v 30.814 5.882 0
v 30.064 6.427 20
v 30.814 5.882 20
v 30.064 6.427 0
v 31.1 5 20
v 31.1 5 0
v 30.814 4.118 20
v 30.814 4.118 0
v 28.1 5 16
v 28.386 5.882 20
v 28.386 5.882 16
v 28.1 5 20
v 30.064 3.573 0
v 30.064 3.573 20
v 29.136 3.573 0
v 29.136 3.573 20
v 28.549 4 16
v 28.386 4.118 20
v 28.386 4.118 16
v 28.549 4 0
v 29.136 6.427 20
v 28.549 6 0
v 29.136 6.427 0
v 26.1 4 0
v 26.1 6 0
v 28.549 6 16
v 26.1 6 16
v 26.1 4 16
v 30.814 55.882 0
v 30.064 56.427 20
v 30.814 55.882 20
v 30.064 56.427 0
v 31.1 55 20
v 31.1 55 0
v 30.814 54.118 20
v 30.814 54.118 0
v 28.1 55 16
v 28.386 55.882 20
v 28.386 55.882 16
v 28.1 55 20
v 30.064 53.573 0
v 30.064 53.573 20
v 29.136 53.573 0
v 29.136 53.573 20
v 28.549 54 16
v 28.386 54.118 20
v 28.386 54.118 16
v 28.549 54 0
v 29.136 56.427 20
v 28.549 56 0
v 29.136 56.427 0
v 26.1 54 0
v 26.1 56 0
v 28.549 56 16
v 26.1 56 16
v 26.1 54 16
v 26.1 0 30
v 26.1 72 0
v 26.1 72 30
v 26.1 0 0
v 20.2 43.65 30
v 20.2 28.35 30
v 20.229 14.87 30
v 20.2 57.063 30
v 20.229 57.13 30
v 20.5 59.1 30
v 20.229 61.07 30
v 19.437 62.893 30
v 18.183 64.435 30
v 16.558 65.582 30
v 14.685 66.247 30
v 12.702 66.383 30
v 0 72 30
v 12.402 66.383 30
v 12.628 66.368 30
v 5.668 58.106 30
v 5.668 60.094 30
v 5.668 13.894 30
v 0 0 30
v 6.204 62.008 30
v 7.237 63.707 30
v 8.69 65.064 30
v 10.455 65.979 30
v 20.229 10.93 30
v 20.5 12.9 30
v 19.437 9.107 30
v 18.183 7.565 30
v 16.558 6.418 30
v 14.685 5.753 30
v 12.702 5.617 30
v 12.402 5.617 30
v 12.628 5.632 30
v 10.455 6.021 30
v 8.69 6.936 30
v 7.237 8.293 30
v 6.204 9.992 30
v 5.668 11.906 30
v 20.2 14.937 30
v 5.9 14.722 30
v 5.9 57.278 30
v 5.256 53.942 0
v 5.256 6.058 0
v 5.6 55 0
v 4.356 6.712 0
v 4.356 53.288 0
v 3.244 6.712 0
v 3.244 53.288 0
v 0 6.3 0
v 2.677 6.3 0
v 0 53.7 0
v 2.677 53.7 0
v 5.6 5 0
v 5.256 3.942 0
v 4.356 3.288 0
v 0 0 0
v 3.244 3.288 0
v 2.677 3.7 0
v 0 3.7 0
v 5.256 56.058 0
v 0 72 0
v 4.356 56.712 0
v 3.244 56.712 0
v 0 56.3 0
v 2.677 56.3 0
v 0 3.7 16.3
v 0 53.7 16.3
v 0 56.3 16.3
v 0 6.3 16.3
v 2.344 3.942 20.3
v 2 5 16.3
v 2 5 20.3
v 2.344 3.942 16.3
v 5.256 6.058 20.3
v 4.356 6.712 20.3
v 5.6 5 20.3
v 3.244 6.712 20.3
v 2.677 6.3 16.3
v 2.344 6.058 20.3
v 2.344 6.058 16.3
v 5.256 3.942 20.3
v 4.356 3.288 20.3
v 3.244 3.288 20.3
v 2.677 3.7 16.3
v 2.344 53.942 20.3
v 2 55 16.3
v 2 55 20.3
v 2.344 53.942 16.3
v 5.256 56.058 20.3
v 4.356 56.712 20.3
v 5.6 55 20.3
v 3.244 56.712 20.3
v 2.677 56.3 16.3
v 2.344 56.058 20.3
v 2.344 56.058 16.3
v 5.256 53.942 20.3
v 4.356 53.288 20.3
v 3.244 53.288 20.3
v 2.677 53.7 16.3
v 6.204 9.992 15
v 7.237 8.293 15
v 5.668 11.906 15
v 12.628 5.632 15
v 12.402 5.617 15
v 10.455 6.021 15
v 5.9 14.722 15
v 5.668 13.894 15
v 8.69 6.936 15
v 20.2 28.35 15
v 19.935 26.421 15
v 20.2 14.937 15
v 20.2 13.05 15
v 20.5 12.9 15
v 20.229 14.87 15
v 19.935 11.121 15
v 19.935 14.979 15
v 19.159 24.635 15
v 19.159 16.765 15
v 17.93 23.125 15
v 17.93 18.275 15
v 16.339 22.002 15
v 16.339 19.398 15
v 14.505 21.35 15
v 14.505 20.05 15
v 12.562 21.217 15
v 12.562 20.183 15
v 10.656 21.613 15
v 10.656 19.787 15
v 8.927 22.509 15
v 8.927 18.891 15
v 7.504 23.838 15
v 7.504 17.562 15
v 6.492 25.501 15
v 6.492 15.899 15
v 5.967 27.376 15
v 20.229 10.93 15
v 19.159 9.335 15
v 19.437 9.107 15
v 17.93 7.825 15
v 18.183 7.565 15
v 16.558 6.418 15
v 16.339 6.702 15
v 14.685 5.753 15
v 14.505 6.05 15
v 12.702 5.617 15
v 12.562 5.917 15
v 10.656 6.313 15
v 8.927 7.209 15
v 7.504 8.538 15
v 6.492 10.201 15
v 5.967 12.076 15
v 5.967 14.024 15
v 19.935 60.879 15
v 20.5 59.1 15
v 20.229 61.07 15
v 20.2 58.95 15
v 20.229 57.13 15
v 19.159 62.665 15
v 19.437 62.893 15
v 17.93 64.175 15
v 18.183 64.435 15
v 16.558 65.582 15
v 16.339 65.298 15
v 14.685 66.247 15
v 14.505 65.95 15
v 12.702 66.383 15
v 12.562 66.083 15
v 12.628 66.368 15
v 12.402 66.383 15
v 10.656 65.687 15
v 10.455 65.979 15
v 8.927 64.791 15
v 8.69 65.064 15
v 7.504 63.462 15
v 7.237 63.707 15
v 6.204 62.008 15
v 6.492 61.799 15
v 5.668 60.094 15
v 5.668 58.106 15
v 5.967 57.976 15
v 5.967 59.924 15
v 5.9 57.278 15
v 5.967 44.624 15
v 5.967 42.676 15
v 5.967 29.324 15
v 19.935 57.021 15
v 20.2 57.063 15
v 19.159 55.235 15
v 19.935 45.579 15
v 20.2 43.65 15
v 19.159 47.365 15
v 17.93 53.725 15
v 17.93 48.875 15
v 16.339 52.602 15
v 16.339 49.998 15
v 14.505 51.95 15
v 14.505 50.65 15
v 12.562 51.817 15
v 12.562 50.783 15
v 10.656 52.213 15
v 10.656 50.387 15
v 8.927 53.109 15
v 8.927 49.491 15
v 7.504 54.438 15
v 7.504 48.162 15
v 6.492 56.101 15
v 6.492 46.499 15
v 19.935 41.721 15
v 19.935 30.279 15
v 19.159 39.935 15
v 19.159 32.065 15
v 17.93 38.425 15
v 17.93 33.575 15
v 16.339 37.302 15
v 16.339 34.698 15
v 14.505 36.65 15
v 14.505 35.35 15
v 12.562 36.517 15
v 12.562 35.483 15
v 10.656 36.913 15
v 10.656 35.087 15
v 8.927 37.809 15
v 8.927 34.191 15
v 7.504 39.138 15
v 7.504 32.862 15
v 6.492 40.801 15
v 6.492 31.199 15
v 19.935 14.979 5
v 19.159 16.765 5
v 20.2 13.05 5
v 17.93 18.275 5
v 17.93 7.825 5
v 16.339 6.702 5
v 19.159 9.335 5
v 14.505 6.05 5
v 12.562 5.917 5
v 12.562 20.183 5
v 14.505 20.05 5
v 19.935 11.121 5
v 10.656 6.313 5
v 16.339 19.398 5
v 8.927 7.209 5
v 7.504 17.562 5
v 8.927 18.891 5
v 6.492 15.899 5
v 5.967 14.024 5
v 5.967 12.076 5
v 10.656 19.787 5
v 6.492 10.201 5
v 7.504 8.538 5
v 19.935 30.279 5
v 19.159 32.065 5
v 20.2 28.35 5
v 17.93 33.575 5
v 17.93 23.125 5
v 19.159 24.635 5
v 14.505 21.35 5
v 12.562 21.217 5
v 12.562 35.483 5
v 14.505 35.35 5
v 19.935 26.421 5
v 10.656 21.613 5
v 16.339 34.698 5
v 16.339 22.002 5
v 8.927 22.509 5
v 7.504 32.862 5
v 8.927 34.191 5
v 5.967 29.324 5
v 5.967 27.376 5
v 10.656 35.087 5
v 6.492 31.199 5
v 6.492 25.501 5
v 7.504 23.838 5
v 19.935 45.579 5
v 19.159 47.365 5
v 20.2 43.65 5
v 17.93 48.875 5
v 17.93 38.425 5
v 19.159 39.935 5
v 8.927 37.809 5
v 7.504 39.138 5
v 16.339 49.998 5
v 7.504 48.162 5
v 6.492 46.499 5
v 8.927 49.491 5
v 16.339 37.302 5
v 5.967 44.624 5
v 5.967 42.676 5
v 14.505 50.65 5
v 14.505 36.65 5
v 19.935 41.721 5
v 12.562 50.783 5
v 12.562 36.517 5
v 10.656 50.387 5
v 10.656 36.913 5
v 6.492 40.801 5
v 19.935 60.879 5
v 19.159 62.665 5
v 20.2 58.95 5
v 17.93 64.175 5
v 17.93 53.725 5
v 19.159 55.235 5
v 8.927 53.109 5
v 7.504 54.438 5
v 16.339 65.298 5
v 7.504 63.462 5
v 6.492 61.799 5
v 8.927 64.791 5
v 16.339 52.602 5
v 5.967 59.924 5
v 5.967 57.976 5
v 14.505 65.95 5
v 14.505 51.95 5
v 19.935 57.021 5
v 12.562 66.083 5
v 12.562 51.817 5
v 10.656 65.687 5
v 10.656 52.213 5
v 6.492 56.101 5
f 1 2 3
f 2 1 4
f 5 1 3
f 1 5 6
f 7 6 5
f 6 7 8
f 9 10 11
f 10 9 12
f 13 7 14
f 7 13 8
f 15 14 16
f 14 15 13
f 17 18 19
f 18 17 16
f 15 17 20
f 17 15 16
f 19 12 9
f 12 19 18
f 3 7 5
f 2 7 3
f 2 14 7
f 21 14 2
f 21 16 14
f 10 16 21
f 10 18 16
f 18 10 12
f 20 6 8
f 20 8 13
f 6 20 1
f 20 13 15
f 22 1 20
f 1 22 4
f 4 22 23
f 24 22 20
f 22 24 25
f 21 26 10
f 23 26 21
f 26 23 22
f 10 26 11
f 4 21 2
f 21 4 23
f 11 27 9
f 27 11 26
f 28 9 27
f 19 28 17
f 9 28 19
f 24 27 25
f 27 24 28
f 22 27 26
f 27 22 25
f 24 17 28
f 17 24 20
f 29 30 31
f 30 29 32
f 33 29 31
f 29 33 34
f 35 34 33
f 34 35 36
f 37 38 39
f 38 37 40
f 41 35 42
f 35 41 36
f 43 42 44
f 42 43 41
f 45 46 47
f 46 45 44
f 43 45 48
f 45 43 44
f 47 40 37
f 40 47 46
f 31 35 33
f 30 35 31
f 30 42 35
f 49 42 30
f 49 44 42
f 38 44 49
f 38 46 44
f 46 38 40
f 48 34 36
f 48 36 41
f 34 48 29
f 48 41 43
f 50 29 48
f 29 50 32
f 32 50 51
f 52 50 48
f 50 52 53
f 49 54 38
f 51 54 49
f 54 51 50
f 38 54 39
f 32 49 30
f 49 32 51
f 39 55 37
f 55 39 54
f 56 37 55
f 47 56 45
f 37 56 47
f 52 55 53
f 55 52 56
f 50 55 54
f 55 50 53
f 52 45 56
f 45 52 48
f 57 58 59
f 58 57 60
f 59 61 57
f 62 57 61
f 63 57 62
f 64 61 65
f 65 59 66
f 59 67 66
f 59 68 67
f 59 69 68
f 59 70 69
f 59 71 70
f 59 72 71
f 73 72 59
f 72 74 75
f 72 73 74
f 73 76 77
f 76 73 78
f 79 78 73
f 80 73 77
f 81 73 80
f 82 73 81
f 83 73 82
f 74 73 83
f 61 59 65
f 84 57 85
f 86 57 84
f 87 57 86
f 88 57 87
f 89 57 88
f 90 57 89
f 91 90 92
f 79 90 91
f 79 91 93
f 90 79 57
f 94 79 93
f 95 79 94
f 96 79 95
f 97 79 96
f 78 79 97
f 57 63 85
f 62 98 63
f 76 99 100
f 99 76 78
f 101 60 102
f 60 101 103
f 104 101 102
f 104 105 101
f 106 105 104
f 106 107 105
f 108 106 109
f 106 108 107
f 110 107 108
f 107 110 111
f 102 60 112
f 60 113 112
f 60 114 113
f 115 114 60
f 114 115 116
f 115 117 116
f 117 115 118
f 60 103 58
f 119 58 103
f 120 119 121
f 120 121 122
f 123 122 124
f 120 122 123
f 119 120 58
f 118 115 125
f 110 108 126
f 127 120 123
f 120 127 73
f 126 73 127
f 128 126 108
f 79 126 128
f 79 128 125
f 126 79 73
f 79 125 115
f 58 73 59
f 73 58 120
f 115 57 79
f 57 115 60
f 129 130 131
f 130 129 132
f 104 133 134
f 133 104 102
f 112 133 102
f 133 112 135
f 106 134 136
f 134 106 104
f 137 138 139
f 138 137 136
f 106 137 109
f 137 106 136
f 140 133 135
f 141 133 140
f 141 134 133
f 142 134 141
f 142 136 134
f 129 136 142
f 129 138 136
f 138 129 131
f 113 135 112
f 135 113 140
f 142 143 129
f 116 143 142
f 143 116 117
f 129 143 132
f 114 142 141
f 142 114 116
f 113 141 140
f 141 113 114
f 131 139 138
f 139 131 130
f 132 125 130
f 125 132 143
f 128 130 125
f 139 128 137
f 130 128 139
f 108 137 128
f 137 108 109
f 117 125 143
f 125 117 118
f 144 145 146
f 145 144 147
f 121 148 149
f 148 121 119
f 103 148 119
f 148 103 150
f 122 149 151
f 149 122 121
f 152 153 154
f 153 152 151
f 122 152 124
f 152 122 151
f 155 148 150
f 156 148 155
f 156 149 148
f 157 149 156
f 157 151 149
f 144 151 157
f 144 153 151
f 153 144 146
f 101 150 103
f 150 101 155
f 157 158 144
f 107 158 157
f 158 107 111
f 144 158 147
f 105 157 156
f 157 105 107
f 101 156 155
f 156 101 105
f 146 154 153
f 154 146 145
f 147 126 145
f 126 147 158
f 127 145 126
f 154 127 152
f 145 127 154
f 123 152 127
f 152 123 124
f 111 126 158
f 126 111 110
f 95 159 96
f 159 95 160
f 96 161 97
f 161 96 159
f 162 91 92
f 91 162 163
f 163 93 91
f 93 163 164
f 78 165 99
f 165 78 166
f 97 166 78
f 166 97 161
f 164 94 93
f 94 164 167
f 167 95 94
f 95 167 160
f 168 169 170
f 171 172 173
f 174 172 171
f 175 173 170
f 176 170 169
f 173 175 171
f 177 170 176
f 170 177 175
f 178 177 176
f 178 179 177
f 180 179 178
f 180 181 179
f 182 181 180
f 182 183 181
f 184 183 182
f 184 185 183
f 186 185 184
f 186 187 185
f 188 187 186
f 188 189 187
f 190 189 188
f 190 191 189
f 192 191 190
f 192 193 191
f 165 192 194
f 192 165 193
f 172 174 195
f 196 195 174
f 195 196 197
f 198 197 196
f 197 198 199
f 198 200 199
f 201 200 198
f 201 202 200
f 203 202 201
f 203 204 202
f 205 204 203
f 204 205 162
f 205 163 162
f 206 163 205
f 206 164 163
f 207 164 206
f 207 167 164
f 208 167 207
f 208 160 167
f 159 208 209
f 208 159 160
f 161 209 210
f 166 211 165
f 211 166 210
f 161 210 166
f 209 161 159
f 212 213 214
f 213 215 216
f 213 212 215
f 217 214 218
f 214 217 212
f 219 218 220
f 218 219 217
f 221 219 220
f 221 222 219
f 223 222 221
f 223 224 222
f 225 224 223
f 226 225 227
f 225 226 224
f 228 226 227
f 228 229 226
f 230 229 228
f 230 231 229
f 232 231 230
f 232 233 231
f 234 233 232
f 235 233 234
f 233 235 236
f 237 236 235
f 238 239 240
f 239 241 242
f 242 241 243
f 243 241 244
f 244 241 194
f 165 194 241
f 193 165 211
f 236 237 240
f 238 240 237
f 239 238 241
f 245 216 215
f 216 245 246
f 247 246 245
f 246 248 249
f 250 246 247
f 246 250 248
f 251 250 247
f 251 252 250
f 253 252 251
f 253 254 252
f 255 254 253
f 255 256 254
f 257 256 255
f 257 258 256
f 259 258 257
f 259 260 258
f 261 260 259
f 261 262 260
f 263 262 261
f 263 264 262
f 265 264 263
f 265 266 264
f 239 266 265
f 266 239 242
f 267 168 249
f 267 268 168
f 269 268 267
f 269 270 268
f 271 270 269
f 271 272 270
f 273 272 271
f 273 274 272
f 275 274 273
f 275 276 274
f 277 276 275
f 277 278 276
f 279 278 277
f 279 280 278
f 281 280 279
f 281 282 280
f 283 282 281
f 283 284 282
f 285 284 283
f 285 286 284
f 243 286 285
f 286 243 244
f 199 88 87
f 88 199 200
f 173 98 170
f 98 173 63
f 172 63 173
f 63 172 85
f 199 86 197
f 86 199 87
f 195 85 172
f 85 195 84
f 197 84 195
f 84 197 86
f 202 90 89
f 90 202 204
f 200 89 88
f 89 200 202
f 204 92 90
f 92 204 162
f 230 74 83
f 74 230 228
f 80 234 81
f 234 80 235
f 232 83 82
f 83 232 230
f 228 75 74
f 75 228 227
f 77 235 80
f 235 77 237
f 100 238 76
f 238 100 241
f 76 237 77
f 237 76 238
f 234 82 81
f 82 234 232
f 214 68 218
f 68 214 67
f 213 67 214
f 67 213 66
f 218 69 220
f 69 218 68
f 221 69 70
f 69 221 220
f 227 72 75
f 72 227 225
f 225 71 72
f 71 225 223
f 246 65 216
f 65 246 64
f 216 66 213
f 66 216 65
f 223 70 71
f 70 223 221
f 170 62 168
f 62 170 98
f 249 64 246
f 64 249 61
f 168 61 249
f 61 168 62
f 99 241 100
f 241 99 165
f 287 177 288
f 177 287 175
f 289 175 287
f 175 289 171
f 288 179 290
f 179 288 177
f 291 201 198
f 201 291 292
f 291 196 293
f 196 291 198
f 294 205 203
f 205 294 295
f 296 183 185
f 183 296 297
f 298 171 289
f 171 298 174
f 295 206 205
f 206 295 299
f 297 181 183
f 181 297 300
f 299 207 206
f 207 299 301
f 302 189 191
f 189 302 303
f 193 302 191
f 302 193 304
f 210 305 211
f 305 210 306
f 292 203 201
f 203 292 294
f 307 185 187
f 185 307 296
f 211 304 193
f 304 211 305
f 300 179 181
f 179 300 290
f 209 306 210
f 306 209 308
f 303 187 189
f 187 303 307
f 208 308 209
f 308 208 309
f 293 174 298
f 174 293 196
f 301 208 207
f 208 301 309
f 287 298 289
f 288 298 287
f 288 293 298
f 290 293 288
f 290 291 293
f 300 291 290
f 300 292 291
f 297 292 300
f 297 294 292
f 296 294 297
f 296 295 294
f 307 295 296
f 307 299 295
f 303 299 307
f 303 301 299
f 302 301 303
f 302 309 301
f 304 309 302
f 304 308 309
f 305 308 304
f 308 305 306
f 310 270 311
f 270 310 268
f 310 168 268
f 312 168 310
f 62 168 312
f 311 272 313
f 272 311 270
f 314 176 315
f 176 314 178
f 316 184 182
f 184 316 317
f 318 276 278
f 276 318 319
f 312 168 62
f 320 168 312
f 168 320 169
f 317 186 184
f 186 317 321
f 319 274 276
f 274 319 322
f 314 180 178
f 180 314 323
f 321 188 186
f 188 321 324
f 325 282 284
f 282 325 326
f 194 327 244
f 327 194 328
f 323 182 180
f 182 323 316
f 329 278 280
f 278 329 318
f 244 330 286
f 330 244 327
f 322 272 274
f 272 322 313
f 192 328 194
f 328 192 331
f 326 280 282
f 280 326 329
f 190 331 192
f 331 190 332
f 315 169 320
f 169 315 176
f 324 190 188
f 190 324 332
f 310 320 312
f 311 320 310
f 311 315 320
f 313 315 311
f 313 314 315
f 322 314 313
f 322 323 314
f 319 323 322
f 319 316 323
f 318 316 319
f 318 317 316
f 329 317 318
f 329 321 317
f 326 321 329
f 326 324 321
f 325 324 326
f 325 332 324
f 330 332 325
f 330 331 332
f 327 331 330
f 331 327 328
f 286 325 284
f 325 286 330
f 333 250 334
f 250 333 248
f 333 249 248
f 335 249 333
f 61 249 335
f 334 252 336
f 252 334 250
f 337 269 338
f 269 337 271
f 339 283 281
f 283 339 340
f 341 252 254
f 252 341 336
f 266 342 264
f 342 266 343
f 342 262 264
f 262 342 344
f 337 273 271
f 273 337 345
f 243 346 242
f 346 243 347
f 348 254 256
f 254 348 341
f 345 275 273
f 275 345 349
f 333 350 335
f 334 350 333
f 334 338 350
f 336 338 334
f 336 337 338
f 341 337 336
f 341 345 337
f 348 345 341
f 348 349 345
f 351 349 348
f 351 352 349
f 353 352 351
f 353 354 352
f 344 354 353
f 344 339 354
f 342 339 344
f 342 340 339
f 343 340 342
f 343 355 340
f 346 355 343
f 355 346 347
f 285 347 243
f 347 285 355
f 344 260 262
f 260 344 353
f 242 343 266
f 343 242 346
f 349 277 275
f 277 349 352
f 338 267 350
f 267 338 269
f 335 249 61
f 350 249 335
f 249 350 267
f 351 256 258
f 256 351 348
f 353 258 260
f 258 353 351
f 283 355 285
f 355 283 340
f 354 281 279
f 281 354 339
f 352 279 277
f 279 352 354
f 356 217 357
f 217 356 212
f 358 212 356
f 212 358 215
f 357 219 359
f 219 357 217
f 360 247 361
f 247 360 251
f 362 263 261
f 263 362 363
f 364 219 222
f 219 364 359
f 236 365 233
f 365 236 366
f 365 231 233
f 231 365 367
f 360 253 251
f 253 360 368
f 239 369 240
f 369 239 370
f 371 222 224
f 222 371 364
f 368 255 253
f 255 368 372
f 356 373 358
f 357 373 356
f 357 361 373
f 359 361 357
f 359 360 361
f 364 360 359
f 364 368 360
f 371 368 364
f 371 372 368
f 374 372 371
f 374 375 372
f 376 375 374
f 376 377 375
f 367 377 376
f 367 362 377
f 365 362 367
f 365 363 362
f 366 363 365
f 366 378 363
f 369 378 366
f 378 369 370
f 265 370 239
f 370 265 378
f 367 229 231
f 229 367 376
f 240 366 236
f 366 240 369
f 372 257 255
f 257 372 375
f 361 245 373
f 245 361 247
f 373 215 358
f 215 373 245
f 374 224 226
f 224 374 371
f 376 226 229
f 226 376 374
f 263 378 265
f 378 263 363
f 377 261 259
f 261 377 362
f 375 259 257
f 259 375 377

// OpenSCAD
/* [Battery Box] */

// The type of battery to hold in the box
type="cylinder"; // [bundle:Round Battery Bundle,cylinder:Round Battery,block:Sqaure Battery]

/* [Bundles] */

// Number of batteries wide in each bundle
bundle_width_count=4; // [2:100]

// Number of batteries long in each bundle
bundle_length_count=1; // [2:100]

// Spacing between batteries in bundles in mm (usually 0)
battery_bundle_spacing=0; // [0:10]

/* [Round Battery] */

// Battery diameter in mm
battery_diameter=14; // [1:100]

/* [Square Battery] */

battery_width=26; // [1:100]
battery_length=17; // [1:100]

/* [Print Details] */

// How much room to give batteries in the box in mm
battery_clearance=0.3; // [0:0.05:1]

/* [Hidden] */

battery_diameter_w_clearance=battery_diameter+battery_clearance;

battery_width_w_clearance=battery_width+battery_clearance;
battery_length_w_clearance=battery_length+battery_clearance;

bundle_width=bundle_width_count*battery_diameter+battery_bundle_spacing*(bundle_width_count-1)+battery_clearance*2;
bundle_length=bundle_length_count*battery_diameter+battery_bundle_spacing*(bundle_length_count-1)+battery_clearance*2;

/* [Battery Box] */

// Number of batteries or bundles wide
battbox_count_wide=1; // [1:100]

// Number of batteries or bundles long
battbox_count_long=4; // [1:100]

// Space between batteries in mm
battbox_spacing=1; // [0:10]

// Height of the battery box in mm
battbox_height=30; // [10:100]

/* [Hidden] */

joint_height=battbox_height * 2/3;
joint_diameter=3;
joint_setback=2;
joint_setback_width=2;
joint_setback_height=joint_height * 4/5;
joint_offset=5;
joint_spacing=50;
joint_v_clearance=0.3;
joint_d_clearance=0.3;

joint_max=1000;

battbox_edge_width_extra=0.3;
battbox_edge_width=joint_setback+joint_diameter+joint_d_clearance*2+battbox_edge_width_extra;
battbox_base_thickness=5;

function battbox_dimension(sizing, count) =
    sizing*count+battbox_spacing*(count-1)+battbox_edge_width*2;

battbox_width_w_bundle=battbox_dimension(bundle_width, battbox_count_wide);
battbox_length_w_bundle=battbox_dimension(bundle_length,battbox_count_long);

battbox_width_w_cylinder=battbox_dimension(battery_diameter+battery_clearance,battbox_count_wide);
battbox_length_w_cylinder=battbox_dimension(battery_diameter+battery_clearance,battbox_count_long);

battbox_width_w_block=battbox_dimension(battery_width+battery_clearance,battbox_count_wide);
battbox_length_w_block=battbox_dimension(battery_length+battery_clearance,battbox_count_long);

function battbox_width() =
    type == "bundle"   ? battbox_width_w_bundle   :
    type == "cylinder" ? battbox_width_w_cylinder :
 /* type == "block" */   battbox_width_w_block;
function battbox_length() =
    type == "bundle"   ? battbox_length_w_bundle   :
    type == "cylinder" ? battbox_length_w_cylinder :
 /* type == "block" */   battbox_length_w_block;

battery_cut_height=battbox_height*2;
battbox_inset_height=battbox_height*1/3;

battbox_inset_width=battbox_width() - battbox_edge_width*2;
battbox_inset_length=battbox_length() - battbox_edge_width*2;

function joint_count() =
    min(joint_max,floor((battbox_length() - joint_offset*2) / joint_spacing)+1);

module joint(cv,cd) {
    union() {
        translate([joint_diameter/2+cd+joint_setback,0,0])
        cylinder(joint_height+cv,d=joint_diameter+cd*2,$fn=10);

        translate([0,-(joint_setback_width/2+cd),0])
        cube([joint_setback+joint_diameter/2+cd,joint_setback_width+cd*2,joint_setback_height+cv]);
    }
}

module joints(cv,cd) {
    union() {
        for (j = [0:joint_count()-1]) {
            translate([0,joint_spacing*j,0])
            joint(cv,cd);
        }
    }
}

module joint_tabs() {
    translate([battbox_width(),joint_offset,0])
    joints(0,0);
}

module joint_sockets() {
    translate([0,joint_offset,0])
    joints(joint_v_clearance, joint_d_clearance);
}

module battbox_inset_cutout() {
    if (type == "bundle" || type == "cylinder") {
        translate([0,0,battbox_base_thickness+battbox_inset_height])
        union() {
            translate([battery_diameter/2,battery_diameter/2,0])
            cylinder(battery_cut_height,d=battery_diameter+battery_clearance*2);
            
            translate([battbox_inset_width-battery_diameter/2,battery_diameter/2,0])
            cylinder(battery_cut_height,d=battery_diameter+battery_clearance*2);
            
            translate([battery_diameter/2,battbox_inset_length-battery_diameter/2,0])
            cylinder(battery_cut_height,d=battery_diameter+battery_clearance*2);
            
            translate([battbox_inset_width-battery_diameter/2,battbox_inset_length-battery_diameter/2,0])
            cylinder(battery_cut_height,d=battery_diameter+battery_clearance*2);
            
            translate([0,battery_diameter/2,0])
            cube([battbox_inset_width,battbox_inset_length-battery_diameter,battery_cut_height]);
            
            translate([battery_diameter/2,0,0])
            cube([battbox_inset_width-battery_diameter,battbox_inset_length,battery_cut_height]);
        }
    }
    else if (type == "block") {
        translate([0,0,battbox_base_thickness+battbox_inset_height])
        cube([battbox_inset_width,battbox_inset_length,battery_cut_height]);
    }
}

module bundle_slot() {
    translate([0,0,battbox_base_thickness])
    union() {
        translate([battery_diameter/2,battery_diameter/2,0])
        cylinder(battery_cut_height,d=battery_diameter+battery_clearance*2);
        
        translate([bundle_width-battery_diameter/2,battery_diameter/2,0])
        cylinder(battery_cut_height,d=battery_diameter+battery_clearance*2);
        
        translate([battery_diameter/2,bundle_length-battery_diameter/2,0])
        cylinder(battery_cut_height,d=battery_diameter+battery_clearance*2);
        
        translate([bundle_width-battery_diameter/2,bundle_length-battery_diameter/2,0])
        cylinder(battery_cut_height,d=battery_diameter+battery_clearance*2);
        
        translate([0,battery_diameter/2,0])
        cube([bundle_width,bundle_length-battery_diameter,battery_cut_height]);
        
        translate([battery_diameter/2,0,0])
        cube([bundle_width-battery_diameter,bundle_length,battery_cut_height]);
    }
}

module cylinder_slot() {
    translate([battery_diameter_w_clearance/2,battery_diameter_w_clearance/2,battbox_base_thickness])
    cylinder(battery_cut_height,d=battery_diameter_w_clearance);
}

module box_slot() {
    translate([0,0,battbox_base_thickness])
    cube([battery_width_w_clearance,battery_length_w_clearance,battery_cut_height]);
}

module slot(w,l) {
    if (type == "bundle") {
        translate([battbox_edge_width+(bundle_width+battbox_spacing)*(w-1),battbox_edge_width+(bundle_length+battbox_spacing)*(l-1),0])
        bundle_slot();
    }
    
    else if (type == "cylinder") {
        translate([battbox_edge_width+(battery_diameter_w_clearance+battbox_spacing)*(w-1),battbox_edge_width+(battery_diameter_w_clearance+battbox_spacing)*(l-1),0])
        cylinder_slot();
    }
    else if (type == "block") {
        translate([battbox_edge_width+(battery_width_w_clearance+battbox_spacing)*(w-1),battbox_edge_width+(battery_length_w_clearance+battbox_spacing)*(l-1),0])
        box_slot();
    }
}

module battery_box() {
    difference() {
        union() {
            cube([battbox_width(),battbox_length(),battbox_height]);       
    
            joint_tabs();
        }

        joint_sockets();

        translate([battbox_edge_width,battbox_edge_width,0])
        battbox_inset_cutout();
    
        for (w = [1:battbox_count_wide]) {
            for(l = [1:battbox_count_long]) {
                slot(w,l);
            }
        }
    }
}

battery_box();
